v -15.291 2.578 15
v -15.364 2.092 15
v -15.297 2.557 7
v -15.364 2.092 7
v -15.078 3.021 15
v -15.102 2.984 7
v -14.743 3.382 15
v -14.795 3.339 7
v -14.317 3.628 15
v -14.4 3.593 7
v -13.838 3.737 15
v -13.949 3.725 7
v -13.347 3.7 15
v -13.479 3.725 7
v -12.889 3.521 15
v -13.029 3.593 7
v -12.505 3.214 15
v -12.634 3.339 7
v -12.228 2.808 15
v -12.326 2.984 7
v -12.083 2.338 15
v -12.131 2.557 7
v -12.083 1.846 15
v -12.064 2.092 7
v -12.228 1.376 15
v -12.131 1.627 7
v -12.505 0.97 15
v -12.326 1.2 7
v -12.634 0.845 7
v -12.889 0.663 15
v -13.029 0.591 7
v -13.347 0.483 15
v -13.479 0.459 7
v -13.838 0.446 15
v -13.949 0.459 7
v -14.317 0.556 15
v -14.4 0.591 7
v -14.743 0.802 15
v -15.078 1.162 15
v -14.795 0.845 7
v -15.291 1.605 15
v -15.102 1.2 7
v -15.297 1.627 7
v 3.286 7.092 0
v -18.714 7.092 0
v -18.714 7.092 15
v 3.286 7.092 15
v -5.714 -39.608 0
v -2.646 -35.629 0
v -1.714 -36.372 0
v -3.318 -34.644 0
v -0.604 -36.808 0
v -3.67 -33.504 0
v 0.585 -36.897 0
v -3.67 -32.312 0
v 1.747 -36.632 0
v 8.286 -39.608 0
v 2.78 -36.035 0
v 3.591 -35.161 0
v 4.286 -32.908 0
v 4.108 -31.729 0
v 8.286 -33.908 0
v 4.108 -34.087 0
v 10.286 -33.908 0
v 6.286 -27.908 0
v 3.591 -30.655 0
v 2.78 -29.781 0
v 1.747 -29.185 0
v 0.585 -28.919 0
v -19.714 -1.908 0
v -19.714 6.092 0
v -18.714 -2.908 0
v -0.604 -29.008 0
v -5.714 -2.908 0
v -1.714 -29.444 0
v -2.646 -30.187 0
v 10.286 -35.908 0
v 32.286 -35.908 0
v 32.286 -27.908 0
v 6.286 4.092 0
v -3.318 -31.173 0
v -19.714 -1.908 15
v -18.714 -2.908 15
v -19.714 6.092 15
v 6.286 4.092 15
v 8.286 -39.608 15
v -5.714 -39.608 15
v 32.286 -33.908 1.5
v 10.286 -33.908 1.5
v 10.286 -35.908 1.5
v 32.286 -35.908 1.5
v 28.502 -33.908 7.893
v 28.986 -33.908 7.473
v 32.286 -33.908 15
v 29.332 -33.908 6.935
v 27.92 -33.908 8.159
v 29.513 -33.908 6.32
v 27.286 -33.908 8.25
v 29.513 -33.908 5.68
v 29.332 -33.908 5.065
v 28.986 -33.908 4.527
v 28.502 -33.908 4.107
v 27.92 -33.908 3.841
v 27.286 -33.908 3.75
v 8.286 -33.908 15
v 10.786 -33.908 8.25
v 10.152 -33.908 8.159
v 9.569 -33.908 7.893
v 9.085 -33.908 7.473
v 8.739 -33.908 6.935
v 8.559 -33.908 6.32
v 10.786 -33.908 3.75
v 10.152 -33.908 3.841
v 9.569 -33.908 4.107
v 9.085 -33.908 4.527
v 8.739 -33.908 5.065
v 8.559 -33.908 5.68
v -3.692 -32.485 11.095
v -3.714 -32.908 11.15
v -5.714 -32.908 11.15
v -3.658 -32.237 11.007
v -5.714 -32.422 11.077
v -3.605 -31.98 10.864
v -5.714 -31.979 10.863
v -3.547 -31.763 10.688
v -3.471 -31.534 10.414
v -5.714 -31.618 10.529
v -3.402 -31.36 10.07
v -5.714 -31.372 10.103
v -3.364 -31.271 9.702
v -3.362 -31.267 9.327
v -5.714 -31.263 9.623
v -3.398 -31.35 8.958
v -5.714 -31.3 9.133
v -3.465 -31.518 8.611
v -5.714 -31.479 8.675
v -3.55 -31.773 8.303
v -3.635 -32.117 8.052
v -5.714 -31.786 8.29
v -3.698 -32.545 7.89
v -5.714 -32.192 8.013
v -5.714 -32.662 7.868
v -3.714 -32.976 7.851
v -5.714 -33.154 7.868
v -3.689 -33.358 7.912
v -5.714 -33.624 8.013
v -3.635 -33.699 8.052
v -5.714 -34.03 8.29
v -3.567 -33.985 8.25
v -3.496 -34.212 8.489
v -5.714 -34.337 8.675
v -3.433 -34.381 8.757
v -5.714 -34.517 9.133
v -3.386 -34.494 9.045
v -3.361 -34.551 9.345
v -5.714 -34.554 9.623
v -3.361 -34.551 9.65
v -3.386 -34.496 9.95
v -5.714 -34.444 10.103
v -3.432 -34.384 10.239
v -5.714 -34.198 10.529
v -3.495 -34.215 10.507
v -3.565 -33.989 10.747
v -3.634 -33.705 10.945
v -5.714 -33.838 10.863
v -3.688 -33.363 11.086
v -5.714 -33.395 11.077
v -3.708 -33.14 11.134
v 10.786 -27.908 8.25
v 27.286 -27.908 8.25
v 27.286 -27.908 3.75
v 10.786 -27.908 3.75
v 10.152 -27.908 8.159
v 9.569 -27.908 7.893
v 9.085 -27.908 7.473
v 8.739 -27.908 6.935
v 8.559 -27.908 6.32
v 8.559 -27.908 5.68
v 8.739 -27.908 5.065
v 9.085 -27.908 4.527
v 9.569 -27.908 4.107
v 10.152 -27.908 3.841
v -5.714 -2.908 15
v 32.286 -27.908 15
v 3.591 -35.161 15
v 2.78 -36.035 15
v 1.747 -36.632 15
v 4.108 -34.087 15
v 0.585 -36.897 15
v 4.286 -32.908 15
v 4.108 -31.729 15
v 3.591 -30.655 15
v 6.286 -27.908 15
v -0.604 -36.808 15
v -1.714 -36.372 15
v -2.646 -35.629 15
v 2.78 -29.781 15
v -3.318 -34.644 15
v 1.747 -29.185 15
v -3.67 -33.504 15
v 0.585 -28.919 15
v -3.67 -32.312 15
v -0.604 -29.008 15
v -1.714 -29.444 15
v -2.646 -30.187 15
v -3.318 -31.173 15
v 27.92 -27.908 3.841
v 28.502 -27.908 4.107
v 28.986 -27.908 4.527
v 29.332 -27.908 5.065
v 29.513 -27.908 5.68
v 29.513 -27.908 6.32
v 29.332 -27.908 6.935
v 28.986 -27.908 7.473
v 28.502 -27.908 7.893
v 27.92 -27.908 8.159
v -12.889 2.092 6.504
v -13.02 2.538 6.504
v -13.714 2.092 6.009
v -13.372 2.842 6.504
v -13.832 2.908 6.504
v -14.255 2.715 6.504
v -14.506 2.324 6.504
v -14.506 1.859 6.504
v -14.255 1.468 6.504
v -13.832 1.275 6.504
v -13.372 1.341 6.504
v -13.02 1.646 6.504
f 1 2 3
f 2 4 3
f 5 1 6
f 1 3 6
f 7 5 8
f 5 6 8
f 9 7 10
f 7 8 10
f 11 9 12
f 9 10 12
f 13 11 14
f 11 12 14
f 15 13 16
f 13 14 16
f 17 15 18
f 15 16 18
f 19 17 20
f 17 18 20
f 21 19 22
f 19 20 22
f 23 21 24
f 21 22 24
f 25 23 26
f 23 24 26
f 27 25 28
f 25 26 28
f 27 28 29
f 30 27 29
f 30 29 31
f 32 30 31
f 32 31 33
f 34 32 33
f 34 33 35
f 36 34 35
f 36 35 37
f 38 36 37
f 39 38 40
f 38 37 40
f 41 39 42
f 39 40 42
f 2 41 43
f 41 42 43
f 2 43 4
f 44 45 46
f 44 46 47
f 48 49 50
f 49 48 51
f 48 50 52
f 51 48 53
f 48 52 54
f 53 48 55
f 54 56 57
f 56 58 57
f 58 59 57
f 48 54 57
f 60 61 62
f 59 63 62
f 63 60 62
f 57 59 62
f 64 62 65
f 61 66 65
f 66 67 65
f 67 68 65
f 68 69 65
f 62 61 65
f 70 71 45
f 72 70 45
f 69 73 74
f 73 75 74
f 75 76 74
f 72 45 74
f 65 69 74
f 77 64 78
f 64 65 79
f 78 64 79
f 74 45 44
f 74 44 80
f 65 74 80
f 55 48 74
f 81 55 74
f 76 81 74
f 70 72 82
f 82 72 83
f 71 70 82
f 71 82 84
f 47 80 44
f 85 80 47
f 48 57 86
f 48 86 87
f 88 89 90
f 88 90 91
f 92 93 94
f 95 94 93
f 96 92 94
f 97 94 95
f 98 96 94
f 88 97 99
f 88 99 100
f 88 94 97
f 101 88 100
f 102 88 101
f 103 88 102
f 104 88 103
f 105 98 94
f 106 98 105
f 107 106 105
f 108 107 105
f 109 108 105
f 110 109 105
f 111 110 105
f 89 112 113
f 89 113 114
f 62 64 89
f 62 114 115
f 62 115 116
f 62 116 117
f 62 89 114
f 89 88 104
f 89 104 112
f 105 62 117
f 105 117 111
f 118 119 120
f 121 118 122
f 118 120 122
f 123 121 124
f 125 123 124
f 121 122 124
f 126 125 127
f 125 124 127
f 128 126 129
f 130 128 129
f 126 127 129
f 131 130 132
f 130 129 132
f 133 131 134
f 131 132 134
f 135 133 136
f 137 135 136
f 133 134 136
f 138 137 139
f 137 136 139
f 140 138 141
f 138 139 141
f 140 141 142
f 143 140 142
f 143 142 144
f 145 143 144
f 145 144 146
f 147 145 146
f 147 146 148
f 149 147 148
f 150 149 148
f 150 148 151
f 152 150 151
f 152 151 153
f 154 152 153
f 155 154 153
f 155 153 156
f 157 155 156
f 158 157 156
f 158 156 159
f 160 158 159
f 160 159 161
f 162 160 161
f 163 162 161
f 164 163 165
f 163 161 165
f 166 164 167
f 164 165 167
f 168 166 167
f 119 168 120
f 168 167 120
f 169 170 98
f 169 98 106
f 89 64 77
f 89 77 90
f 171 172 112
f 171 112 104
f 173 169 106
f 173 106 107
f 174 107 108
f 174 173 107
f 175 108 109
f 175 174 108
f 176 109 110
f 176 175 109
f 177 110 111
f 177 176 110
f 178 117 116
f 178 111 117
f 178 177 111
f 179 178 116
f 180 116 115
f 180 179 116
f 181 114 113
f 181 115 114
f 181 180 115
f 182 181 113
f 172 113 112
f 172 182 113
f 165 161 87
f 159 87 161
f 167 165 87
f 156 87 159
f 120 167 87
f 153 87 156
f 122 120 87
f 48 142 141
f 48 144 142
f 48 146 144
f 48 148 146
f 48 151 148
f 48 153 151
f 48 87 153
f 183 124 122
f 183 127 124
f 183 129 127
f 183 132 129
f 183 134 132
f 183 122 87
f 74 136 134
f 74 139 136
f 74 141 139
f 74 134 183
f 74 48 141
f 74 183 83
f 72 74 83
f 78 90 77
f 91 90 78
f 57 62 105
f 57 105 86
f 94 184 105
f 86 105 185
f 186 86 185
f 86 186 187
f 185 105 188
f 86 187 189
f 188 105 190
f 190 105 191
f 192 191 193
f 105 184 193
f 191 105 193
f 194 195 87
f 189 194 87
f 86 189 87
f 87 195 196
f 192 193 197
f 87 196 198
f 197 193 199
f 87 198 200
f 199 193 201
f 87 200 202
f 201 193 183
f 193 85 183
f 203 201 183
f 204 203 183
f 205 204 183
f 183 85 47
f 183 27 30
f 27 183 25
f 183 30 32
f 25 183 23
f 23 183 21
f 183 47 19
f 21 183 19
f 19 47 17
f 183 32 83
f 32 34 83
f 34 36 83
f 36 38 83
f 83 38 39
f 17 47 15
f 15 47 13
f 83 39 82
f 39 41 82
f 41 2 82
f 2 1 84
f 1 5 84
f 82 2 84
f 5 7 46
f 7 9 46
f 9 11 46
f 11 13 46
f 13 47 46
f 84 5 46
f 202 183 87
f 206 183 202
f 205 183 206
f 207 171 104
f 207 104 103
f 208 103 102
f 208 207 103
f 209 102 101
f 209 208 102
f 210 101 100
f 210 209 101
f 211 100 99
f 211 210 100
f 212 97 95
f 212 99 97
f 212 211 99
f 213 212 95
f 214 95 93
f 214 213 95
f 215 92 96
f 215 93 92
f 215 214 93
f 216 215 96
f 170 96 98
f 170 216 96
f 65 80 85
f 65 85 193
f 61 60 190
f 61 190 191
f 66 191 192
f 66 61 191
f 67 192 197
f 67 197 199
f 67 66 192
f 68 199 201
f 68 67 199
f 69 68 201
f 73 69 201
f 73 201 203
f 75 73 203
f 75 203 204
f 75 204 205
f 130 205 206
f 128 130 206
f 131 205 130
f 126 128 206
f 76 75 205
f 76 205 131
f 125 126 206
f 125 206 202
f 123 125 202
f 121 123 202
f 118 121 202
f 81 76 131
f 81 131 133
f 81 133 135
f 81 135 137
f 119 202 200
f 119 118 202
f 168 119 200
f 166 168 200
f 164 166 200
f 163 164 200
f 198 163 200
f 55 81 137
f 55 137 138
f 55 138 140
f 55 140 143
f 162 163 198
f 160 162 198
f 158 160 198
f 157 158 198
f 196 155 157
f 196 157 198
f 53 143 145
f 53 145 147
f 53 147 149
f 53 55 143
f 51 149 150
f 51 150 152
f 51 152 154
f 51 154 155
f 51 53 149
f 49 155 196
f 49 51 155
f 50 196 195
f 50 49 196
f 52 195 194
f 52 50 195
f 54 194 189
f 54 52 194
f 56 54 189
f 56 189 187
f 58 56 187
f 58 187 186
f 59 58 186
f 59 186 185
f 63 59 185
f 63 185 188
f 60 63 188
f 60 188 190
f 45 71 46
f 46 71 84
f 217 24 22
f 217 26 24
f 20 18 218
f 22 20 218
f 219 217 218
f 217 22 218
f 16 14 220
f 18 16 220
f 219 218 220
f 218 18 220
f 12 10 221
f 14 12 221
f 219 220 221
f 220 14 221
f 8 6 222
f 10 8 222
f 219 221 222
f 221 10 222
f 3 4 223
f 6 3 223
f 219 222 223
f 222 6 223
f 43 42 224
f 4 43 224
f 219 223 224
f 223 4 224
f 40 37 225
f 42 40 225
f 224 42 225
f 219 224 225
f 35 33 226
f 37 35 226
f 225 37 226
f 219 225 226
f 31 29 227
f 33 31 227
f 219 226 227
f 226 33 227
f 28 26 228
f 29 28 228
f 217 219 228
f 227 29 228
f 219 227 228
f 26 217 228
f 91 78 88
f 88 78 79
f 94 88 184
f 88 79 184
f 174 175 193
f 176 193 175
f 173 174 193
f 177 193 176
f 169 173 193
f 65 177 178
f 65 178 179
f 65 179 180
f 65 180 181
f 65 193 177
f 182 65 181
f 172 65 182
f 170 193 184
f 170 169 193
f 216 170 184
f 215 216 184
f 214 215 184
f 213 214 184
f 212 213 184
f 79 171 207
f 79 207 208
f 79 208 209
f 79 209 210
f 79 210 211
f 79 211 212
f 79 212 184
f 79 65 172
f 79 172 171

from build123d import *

# Parameters (mm, degrees)
SKETCH1_R                  = 4
BOSS_EXTRUDE1_DEPTH        = 15
SKETCH2_W                  = 22
SKETCH2_H                  = 1.5
BOSS_EXTRUDE2_DEPTH        = 2
CUT_EXTRUDE1_DEPTH         = 50.923615123
M4X0_7_TAPPED_HOLE1_REACH  = 58.902
M4X0_7_TAPPED_HOLE1_BORE_R = 1.65
M4X0_7_TAPPED_HOLE2_D      = 3.3
M4X0_7_TAPPED_HOLE2_DEPTH  = 8
M4X0_7_TAPPED_HOLE2_TIP    = 0.991420021
CHAMFER1_SIZE              = 1
CHAMFER2_SIZE              = 3


with BuildPart() as part:
    # Sketch1 → Boss-Extrude1 (new body)
    with BuildSketch(Plane.XY):
        Polygon((-19.714285714, 7.091836735), (6.285714286, 7.091836735), (6.285714286, -27.908163265), (32.285714286, -27.908163265), (32.285714286, -33.908163265), (8.285714286, -33.908163265), (8.285714286, -39.608163265), (-5.714285714, -39.608163265), (-5.714285714, -2.908163265), (-19.714285714, -2.908163265), align=None)
        with Locations((0.285714286, -32.908163265)):
            Circle(SKETCH1_R, mode=Mode.SUBTRACT)
    extrude(amount=BOSS_EXTRUDE1_DEPTH)

    # Sketch2 → Boss-Extrude2 (add)
    with BuildSketch(Plane.XZ.offset(33.908163265)):
        with Locations((21.285714286, 0.75)):
            Rectangle(SKETCH2_W, SKETCH2_H)
    extrude(amount=BOSS_EXTRUDE2_DEPTH)

    # Sketch3 → Cut-Extrude1 (cut, through all)
    with BuildSketch(Plane(origin=(0, -27.908163265, 0), x_dir=(1, 0, 0), z_dir=(0, 1, 0))):
        with BuildLine():
            Line((10.785714286, -3.75), (27.285714286, -3.75))
            ThreePointArc((27.285714286, -3.75), (29.535714286, -6), (27.285714286, -8.25))
            Line((27.285714286, -8.25), (10.785714286, -8.25))
            ThreePointArc((10.785714286, -8.25), (8.535714286, -6), (10.785714286, -3.75))
        make_face()
    extrude(amount=-CUT_EXTRUDE1_DEPTH, mode=Mode.SUBTRACT)

    # M4x0.7 Tapped Hole1 bore → M4x0.7 Tapped Hole1 (cut, up to next)
    with BuildSketch(Plane.ZY.offset(5.714285714), mode=Mode.PRIVATE) as m4x0_7_tapped_hole1_sk1:
        with Locations((9.5, -32.908163265)):
            Circle(M4X0_7_TAPPED_HOLE1_BORE_R)
    m4x0_7_tapped_hole1_tool1 = extrude(m4x0_7_tapped_hole1_sk1.sketch, amount=-M4X0_7_TAPPED_HOLE1_REACH, mode=Mode.PRIVATE) & part.part
    add(m4x0_7_tapped_hole1_tool1.solids().sort_by_distance((-5.714286, -32.908163, 9.5))[0], mode=Mode.SUBTRACT)

    # M4x0.7 Tapped Hole2
    with Locations(Plane.XY.offset(15)):
        with Locations((-13.714285714, 2.091836735)):
            Hole(M4X0_7_TAPPED_HOLE2_D / 2, depth=M4X0_7_TAPPED_HOLE2_DEPTH)
            with Locations((0, 0, -(M4X0_7_TAPPED_HOLE2_DEPTH + M4X0_7_TAPPED_HOLE2_TIP / 2))):  # 118° drill point
                Cone(0, M4X0_7_TAPPED_HOLE2_D / 2, M4X0_7_TAPPED_HOLE2_TIP, mode=Mode.SUBTRACT)

    # Chamfer1
    chamfer1_edges = [part.edges().sort_by_distance(p)[0] for p in [
        (-19.714285714, 7.091836735, 7.5),
        (-19.714285714, -2.908163265, 7.5),
    ]]
    chamfer(chamfer1_edges, length=CHAMFER1_SIZE)

    # Chamfer2
    chamfer2_edges = [part.edges().sort_by_distance(p)[0] for p in [
        (6.285714286, 7.091836735, 7.5),
    ]]
    chamfer(chamfer2_edges, length=CHAMFER2_SIZE)


solid = part.part
